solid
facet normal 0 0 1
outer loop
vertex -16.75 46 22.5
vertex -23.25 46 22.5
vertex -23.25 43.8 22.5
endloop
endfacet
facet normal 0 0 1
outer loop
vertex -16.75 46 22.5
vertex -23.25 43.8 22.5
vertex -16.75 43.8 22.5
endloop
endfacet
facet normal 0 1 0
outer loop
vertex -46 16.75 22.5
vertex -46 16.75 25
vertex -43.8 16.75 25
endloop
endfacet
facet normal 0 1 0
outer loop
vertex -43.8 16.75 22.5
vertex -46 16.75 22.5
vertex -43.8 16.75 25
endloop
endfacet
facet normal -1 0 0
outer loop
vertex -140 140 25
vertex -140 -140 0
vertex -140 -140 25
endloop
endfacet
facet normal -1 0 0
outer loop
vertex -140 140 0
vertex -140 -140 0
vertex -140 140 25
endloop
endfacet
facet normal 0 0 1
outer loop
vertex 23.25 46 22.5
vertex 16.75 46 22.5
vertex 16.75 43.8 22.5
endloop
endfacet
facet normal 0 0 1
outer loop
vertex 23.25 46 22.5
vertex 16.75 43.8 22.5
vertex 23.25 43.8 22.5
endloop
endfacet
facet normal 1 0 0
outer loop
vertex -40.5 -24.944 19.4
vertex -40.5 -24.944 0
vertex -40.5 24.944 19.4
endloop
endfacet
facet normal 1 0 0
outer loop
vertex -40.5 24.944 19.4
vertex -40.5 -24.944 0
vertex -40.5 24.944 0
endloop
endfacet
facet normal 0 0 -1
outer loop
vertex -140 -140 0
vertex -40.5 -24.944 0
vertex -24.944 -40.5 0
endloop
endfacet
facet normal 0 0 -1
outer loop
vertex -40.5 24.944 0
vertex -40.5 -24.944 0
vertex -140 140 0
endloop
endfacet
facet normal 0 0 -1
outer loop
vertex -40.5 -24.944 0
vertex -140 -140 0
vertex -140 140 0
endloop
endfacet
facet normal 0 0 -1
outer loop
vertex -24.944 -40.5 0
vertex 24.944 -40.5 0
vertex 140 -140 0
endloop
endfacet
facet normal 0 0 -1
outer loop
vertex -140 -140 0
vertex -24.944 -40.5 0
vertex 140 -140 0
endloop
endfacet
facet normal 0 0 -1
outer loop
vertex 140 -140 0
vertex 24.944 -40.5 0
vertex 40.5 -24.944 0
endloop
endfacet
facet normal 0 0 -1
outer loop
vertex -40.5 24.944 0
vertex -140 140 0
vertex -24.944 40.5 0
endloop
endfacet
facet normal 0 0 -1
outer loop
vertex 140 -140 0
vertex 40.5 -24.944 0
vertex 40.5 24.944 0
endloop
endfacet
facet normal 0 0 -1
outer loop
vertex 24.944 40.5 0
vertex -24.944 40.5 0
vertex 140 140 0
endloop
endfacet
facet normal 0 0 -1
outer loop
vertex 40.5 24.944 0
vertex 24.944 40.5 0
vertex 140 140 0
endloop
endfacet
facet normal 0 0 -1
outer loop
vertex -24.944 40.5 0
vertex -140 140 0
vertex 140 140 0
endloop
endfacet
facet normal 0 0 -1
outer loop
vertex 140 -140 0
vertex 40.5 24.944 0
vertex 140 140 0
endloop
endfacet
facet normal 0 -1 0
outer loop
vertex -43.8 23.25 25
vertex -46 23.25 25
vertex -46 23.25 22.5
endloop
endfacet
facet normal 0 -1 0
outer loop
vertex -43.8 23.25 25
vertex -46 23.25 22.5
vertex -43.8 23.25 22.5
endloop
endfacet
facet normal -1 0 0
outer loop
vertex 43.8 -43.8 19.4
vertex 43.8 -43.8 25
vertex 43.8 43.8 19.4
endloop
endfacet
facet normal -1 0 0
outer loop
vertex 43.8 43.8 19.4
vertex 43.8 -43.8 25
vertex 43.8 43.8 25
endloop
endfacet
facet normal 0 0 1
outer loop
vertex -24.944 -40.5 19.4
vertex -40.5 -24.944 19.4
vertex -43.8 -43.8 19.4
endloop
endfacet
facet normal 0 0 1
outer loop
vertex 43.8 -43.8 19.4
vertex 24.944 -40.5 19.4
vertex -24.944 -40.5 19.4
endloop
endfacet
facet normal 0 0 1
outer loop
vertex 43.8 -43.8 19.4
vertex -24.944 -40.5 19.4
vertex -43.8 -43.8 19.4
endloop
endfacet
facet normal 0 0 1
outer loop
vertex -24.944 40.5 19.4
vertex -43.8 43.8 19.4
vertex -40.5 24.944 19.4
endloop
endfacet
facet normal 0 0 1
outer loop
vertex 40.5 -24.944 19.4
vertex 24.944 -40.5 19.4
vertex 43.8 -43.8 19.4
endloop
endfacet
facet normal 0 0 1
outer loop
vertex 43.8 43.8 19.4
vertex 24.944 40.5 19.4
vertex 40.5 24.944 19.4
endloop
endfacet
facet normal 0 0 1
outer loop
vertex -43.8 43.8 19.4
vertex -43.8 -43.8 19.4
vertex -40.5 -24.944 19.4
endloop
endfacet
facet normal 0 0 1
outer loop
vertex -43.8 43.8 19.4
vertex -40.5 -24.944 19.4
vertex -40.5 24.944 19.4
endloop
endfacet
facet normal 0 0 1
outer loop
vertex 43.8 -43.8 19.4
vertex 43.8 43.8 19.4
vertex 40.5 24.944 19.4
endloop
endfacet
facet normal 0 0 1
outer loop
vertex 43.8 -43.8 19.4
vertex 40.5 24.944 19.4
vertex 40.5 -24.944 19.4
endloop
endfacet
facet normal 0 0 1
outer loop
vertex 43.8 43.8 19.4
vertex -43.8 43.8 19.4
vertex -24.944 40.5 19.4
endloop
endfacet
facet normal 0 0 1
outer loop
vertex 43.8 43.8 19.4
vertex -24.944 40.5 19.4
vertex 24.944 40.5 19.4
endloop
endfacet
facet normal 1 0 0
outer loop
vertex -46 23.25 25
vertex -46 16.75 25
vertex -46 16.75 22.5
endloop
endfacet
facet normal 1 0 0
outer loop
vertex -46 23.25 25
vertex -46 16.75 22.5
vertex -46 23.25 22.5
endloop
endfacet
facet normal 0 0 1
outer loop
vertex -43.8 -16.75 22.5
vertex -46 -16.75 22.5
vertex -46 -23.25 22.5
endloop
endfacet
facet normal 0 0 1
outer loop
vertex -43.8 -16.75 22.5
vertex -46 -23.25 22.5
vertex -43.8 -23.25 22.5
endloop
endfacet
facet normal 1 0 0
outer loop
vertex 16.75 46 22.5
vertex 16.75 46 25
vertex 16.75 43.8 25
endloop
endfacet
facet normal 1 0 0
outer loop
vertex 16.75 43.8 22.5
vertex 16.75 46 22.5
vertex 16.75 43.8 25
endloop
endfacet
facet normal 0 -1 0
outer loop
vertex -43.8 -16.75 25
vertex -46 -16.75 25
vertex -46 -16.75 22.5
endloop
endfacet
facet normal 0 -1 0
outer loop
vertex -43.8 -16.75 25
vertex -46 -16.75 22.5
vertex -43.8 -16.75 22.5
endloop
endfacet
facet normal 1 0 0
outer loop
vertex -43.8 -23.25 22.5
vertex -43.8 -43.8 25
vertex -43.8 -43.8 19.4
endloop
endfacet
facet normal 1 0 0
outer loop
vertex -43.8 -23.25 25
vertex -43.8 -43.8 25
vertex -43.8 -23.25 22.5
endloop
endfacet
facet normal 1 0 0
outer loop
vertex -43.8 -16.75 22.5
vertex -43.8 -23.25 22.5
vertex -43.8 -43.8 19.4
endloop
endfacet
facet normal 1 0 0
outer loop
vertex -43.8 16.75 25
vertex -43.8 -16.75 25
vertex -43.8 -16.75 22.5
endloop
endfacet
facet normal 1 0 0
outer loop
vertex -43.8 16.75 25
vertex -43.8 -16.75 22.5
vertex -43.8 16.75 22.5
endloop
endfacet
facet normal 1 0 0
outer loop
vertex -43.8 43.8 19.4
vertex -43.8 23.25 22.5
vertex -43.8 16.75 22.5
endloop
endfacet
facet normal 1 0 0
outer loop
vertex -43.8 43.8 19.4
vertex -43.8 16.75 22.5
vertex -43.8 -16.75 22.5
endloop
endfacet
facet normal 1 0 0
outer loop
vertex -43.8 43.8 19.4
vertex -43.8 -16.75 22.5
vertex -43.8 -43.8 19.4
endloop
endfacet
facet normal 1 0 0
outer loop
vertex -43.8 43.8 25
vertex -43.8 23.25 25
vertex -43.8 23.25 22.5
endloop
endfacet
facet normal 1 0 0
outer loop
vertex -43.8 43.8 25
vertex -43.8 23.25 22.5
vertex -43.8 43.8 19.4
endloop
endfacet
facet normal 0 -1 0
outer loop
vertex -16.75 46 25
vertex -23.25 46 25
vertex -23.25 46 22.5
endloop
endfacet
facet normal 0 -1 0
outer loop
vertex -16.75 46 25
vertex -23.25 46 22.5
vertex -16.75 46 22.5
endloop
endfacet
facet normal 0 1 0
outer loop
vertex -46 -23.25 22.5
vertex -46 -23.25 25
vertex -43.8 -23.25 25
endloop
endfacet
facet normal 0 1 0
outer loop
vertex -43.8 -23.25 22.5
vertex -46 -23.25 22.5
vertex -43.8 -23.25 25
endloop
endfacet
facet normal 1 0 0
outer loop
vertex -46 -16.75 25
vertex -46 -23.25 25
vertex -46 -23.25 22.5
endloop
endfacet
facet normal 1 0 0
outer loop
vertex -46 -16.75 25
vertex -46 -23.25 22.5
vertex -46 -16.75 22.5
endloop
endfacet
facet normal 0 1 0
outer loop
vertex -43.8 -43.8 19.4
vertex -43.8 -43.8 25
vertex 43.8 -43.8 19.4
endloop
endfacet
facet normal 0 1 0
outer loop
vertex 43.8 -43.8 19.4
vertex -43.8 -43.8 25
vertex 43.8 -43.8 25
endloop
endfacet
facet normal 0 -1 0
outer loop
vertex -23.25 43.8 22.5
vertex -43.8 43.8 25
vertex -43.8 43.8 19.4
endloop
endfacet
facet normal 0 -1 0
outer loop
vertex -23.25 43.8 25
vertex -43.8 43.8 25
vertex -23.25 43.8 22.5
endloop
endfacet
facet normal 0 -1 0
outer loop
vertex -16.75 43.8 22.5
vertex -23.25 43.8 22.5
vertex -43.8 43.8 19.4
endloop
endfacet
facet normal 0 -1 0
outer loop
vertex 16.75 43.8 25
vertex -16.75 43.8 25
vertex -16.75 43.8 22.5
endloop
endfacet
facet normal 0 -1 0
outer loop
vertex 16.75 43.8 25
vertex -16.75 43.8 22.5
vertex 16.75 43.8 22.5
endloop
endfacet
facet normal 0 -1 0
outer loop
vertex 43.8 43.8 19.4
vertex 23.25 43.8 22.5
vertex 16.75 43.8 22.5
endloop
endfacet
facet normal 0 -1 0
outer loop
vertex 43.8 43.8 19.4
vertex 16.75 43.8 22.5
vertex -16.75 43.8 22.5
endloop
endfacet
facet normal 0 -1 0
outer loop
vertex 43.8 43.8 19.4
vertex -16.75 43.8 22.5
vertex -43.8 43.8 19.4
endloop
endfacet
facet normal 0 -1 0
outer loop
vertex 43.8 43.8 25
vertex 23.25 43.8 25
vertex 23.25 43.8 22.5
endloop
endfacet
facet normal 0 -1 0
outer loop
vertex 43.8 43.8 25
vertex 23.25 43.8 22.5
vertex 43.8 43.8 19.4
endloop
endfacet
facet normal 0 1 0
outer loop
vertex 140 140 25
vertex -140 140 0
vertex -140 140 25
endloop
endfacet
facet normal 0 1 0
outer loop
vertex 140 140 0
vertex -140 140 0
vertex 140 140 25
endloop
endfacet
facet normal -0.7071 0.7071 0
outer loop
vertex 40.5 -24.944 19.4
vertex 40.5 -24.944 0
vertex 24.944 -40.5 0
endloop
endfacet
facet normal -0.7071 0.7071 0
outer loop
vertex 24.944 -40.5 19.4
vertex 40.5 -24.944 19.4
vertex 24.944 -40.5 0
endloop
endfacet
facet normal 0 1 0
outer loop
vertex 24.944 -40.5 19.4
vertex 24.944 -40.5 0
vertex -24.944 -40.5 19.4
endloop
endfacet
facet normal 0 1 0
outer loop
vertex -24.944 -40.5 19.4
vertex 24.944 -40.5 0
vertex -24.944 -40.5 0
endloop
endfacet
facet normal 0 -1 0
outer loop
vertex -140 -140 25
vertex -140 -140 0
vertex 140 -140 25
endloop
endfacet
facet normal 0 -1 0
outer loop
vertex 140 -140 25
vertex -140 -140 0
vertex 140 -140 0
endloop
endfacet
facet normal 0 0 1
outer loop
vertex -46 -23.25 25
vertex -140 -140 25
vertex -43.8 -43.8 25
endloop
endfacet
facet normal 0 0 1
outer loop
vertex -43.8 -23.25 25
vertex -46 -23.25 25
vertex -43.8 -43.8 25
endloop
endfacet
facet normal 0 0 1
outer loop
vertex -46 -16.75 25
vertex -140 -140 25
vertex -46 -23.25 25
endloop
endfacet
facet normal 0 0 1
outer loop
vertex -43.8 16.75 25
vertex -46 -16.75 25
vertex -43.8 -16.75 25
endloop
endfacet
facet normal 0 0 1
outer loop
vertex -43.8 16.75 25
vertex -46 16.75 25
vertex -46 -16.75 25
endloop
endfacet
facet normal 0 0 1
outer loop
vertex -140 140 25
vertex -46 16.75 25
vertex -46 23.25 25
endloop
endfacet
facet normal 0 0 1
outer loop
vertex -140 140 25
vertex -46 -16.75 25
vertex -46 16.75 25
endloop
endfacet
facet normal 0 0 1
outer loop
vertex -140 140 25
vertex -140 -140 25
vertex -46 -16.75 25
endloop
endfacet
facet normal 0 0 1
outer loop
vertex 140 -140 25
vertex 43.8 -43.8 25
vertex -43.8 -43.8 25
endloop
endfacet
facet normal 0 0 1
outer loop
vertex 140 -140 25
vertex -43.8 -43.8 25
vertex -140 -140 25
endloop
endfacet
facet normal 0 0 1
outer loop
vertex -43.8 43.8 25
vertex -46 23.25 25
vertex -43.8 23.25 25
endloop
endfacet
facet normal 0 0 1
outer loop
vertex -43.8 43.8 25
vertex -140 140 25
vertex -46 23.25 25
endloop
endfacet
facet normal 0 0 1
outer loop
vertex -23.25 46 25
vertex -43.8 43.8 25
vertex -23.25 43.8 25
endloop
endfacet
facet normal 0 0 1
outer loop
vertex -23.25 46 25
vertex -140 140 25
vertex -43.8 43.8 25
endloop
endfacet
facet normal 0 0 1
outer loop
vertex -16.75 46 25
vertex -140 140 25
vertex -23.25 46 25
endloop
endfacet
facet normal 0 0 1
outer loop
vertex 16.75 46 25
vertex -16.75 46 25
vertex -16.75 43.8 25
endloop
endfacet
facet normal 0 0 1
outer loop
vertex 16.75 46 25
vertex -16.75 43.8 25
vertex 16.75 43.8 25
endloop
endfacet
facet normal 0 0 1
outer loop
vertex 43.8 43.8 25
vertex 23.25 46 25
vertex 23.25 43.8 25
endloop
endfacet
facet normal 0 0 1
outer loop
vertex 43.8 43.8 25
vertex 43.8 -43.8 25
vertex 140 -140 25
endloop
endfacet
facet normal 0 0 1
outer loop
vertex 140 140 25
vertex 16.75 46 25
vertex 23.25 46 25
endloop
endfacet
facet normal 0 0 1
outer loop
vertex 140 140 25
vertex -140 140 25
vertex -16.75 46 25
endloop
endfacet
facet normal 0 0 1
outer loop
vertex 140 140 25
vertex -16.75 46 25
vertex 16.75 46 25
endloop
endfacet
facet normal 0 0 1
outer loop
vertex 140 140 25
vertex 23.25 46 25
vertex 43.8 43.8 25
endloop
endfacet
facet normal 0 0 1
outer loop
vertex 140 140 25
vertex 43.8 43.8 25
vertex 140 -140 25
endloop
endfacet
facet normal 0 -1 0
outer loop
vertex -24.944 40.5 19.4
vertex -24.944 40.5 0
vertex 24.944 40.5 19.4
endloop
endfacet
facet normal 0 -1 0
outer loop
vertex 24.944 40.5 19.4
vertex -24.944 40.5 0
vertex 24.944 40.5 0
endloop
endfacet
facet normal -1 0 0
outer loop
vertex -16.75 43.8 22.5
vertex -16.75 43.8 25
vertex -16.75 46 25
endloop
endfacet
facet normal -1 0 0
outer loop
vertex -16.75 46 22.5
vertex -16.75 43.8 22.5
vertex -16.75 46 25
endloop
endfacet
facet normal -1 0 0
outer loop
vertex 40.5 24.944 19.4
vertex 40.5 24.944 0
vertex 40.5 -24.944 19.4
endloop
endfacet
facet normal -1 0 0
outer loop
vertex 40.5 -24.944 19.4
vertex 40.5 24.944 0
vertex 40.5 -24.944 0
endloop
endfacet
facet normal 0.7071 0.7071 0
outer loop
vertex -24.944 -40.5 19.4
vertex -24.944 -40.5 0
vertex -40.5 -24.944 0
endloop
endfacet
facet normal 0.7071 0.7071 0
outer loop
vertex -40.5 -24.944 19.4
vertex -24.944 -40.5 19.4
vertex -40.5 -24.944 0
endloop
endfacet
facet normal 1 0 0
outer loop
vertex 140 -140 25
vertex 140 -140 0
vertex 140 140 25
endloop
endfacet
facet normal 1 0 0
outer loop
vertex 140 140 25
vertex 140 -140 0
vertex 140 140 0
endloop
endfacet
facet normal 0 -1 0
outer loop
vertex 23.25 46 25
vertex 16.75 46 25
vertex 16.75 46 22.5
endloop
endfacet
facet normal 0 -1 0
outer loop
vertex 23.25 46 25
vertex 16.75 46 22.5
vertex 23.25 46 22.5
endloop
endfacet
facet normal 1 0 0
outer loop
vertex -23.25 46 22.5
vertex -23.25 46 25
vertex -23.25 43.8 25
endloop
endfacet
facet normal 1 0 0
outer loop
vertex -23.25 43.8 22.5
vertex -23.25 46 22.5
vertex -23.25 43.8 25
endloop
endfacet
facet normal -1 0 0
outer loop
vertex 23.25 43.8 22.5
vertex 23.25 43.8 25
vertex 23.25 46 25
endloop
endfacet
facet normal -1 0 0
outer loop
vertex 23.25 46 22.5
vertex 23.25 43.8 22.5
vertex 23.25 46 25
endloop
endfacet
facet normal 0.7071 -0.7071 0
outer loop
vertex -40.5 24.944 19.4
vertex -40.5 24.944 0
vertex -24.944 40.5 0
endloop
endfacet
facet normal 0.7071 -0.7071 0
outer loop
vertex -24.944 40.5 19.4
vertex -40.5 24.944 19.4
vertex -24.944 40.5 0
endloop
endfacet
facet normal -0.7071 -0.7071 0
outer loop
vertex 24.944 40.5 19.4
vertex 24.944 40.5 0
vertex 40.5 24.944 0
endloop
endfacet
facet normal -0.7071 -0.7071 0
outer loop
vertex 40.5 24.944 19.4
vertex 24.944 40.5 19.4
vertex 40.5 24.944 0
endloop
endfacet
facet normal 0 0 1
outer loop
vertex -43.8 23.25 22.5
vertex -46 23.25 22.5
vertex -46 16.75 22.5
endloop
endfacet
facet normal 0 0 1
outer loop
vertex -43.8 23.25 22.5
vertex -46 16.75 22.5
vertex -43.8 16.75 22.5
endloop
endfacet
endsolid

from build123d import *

# Parameters (mm, degrees)
F0_W     = 280
F0_H     = 280
F1_DEPTH = 25
F2_W     = 6.5
F2_H     = 5.5
F2_W_2   = 11
F2_H_2   = 6.5
F3_DEPTH = 2.5
F4_W     = 87.6
F4_H     = 87.6
F5_DEPTH = 5.6


with BuildPart() as f1:
    # F0 (on Top) → F1 (new body)
    with BuildSketch(Plane.XY):
        Rectangle(F0_W, F0_H)
        Polygon((-40.5, 24.943651), (-24.943651, 40.5), (24.943651, 40.5), (40.5, 24.943651), (40.5, -24.943651), (24.943651, -40.5), (-24.943651, -40.5), (-40.5, -24.943651), align=None, mode=Mode.SUBTRACT)
    extrude(amount=F1_DEPTH)

    # F2 (on face) → F3 (cut)
    with BuildSketch(Plane.XY.offset(25)):
        with Locations((-20, 43.25)):
            Rectangle(F2_W, F2_H)
        with Locations((-20, 37.75)):
            Rectangle(F2_W, F2_H)
        with Locations((20, 43.25)):
            Rectangle(F2_W, F2_H)
        with Locations((20, 37.75)):
            Rectangle(F2_W, F2_H)
        with Locations((-40.5, 20)):
            Rectangle(F2_W_2, F2_H_2)
        with Locations((-40.5, -20)):
            Rectangle(F2_W_2, F2_H_2)
    extrude(amount=-F3_DEPTH, mode=Mode.SUBTRACT)

    # F4 (on face) → F5 (cut)
    with BuildSketch(Plane.XY.offset(25)):
        Rectangle(F4_W, F4_H)
    extrude(amount=-F5_DEPTH, mode=Mode.SUBTRACT)


solid = f1.part
